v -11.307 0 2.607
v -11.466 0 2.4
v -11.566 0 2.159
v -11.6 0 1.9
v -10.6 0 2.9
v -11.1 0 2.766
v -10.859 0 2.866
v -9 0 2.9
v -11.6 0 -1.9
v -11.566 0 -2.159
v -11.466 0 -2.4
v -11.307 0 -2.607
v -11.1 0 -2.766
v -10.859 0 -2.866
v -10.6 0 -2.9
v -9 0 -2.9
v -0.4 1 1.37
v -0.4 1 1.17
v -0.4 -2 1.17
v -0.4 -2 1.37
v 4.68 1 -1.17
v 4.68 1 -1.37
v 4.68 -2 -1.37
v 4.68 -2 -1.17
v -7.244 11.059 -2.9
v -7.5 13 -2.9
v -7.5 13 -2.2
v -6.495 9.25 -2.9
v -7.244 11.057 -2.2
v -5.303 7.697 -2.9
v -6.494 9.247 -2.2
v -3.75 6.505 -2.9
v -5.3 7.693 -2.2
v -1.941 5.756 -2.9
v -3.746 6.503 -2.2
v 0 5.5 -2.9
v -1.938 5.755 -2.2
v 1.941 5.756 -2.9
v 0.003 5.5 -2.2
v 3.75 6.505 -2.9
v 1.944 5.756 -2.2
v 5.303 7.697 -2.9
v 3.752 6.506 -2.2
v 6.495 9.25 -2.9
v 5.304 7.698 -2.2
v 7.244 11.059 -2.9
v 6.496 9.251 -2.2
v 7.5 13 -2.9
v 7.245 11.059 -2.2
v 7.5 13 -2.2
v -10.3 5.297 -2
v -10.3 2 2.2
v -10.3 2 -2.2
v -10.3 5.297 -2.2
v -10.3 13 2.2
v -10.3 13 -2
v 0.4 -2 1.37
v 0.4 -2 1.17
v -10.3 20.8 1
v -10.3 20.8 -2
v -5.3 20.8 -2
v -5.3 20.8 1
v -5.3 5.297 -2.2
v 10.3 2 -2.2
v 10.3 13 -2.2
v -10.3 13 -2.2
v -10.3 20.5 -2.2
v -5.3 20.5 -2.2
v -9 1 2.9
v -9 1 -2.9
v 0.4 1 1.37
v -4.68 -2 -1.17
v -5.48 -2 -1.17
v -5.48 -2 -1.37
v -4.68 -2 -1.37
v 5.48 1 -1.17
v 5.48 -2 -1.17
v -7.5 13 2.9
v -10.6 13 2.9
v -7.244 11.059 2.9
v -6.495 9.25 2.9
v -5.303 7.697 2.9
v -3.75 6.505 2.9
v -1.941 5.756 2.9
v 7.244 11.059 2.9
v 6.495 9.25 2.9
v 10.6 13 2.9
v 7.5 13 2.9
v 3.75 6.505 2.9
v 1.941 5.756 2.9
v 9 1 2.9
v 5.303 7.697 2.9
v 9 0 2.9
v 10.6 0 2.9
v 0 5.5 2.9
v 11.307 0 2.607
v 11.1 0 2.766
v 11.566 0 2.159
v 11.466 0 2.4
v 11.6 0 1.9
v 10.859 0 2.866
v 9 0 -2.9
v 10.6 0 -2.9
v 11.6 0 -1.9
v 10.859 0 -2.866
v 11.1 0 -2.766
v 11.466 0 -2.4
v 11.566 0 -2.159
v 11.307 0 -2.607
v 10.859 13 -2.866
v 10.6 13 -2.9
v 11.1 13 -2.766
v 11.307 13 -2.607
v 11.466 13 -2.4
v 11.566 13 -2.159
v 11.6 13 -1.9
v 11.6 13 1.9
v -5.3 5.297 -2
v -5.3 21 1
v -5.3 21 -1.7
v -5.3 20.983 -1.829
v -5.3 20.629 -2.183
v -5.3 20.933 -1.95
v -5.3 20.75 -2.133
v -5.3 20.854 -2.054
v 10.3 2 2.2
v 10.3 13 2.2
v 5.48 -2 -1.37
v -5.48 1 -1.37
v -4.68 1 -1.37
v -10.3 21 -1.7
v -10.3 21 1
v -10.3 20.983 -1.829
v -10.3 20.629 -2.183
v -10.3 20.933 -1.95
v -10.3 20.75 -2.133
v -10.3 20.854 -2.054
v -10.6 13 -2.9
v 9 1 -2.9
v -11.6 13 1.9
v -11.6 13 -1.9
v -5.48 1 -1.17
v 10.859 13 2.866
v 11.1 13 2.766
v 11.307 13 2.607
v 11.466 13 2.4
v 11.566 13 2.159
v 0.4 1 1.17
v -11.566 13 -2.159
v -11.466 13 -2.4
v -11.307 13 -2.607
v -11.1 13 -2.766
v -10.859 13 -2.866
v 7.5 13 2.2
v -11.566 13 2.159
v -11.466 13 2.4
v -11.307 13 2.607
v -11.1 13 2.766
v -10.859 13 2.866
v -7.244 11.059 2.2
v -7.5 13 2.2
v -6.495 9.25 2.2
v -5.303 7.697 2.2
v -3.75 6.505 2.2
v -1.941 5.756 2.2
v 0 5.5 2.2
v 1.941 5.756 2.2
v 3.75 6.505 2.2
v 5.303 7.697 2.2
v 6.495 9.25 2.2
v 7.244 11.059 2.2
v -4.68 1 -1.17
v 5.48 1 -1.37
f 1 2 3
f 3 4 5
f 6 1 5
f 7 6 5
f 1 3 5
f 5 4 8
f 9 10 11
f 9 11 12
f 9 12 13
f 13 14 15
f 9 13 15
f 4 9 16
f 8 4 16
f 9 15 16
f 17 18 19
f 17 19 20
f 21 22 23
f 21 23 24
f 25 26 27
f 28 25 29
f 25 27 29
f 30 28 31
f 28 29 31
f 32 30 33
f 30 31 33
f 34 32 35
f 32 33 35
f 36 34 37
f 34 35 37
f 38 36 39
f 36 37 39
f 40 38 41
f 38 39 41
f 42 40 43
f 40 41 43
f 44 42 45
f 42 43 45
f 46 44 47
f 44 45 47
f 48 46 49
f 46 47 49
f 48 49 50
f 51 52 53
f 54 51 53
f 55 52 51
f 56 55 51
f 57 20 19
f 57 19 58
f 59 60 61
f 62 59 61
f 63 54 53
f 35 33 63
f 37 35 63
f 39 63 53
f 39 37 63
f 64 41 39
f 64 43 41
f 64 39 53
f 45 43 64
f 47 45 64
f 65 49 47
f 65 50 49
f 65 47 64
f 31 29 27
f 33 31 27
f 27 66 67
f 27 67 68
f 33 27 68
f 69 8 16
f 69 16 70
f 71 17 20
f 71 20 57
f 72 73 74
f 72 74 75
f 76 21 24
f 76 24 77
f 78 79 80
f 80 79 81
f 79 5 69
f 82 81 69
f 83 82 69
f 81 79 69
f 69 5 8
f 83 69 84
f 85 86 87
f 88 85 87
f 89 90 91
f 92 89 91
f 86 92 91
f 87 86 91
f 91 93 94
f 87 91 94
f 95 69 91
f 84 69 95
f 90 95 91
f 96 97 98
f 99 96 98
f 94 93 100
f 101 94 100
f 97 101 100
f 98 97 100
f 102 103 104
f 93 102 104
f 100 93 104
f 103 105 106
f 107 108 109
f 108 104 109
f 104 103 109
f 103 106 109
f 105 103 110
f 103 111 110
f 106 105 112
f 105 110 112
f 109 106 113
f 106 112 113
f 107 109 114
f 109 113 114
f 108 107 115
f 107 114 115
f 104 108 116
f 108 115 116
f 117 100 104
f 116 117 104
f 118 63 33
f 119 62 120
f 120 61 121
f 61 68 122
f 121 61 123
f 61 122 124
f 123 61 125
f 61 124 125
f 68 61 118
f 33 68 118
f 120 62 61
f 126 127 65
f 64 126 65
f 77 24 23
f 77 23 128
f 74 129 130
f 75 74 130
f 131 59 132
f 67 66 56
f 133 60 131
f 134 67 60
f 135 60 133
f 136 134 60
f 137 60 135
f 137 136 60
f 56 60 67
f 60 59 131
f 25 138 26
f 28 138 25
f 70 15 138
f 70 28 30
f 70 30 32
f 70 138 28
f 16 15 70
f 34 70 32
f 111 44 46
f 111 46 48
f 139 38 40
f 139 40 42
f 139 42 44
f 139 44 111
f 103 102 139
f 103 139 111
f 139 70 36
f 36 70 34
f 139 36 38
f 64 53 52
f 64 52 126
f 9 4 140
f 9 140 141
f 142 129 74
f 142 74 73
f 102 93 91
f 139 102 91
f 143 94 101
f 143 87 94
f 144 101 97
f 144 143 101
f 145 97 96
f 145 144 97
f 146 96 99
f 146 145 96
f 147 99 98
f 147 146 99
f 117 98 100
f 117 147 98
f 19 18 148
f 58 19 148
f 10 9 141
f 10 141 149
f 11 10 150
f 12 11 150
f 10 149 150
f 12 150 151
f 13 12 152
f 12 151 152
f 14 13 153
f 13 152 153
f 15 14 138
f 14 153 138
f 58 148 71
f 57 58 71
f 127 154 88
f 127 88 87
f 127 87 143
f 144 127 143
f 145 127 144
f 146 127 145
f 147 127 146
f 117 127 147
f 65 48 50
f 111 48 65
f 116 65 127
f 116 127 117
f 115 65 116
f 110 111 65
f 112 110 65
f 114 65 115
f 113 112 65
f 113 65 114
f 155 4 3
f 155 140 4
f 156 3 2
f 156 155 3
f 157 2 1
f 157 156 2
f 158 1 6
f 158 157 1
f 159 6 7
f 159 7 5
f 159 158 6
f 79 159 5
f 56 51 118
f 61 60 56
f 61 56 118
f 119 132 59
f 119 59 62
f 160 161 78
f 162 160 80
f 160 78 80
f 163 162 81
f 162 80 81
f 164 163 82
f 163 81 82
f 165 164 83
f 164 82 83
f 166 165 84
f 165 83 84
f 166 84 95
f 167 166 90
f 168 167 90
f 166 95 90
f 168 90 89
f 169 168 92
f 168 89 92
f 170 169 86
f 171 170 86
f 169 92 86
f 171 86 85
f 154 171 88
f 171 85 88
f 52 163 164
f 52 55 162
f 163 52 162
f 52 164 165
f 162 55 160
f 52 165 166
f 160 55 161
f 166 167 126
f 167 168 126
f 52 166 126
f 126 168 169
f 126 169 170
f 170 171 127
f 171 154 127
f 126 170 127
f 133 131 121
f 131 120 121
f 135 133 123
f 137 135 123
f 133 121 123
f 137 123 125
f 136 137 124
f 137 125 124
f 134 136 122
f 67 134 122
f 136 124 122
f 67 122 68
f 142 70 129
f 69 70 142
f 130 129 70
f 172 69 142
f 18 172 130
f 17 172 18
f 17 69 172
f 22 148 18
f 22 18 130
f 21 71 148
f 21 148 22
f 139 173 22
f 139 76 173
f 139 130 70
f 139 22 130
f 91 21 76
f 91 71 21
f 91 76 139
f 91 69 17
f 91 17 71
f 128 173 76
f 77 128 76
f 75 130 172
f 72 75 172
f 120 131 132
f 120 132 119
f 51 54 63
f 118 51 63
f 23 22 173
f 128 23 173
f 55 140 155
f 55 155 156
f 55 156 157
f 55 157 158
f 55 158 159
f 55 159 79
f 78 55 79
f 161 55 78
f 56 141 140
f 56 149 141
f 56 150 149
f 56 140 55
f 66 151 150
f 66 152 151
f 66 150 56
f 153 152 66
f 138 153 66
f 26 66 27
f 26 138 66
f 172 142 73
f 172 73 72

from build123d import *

# Parameters (mm, degrees)
SKETCH1_W           = 23.2
SKETCH1_H           = 5.8
BOSS_EXTRUDE1_DEPTH = 13
SKETCH2_R           = 7.5
SKETCH2_W           = 18
SKETCH2_H           = 5.61118816
CUT_EXTRUDE1_DEPTH  = 19.36300629
SKETCH3_W           = 20.6
SKETCH3_H           = 4.4
CUT_EXTRUDE2_DEPTH  = 11
SKETCH4_W           = 0.8
SKETCH4_H           = 0.2
BOSS_EXTRUDE2_DEPTH = 3
FILLET1_R           = 1
SKETCH5_W           = 5
SKETCH5_H           = 15.702848837
BOSS_EXTRUDE3_DEPTH = 0.2
SKETCH6_W           = 5
SKETCH6_H           = 0.2
BOSS_EXTRUDE4_DEPTH = 3
FILLET2_R           = 0.5


with BuildPart() as part:
    # Sketch1 → Boss-Extrude1 (new body)
    with BuildSketch(Plane(origin=(0, 0, 0), x_dir=(1, 0, 0), z_dir=(0, 1, 0))):
        Rectangle(SKETCH1_W, SKETCH1_H)
    extrude(amount=BOSS_EXTRUDE1_DEPTH)

    # Sketch2 → Cut-Extrude1 (cut, through all)
    with BuildSketch(Plane.XY.offset(2.9)):
        with Locations((0, 13)):
            Circle(SKETCH2_R)
        with Locations((0, -1.80559408)):
            Rectangle(SKETCH2_W, SKETCH2_H)
    extrude(amount=-CUT_EXTRUDE1_DEPTH, mode=Mode.SUBTRACT)

    # Sketch3 → Cut-Extrude2 (cut)
    with BuildSketch(Plane(origin=(0, 13, 0), x_dir=(1, 0, 0), z_dir=(0, 1, 0))):
        Rectangle(SKETCH3_W, SKETCH3_H)
    extrude(amount=-CUT_EXTRUDE2_DEPTH, mode=Mode.SUBTRACT)

    # Sketch4 → Boss-Extrude2 (add)
    with BuildSketch(Plane.XZ.offset(-1)):
        with Locations((0, 1.27)):
            Rectangle(SKETCH4_W, SKETCH4_H)
        with Locations((-5.08, -1.27)):
            Rectangle(SKETCH4_W, SKETCH4_H)
        with Locations((5.08, -1.27)):
            Rectangle(SKETCH4_W, SKETCH4_H)
    extrude(amount=BOSS_EXTRUDE2_DEPTH)

    # Fillet1
    fillet1_edges = [part.edges().sort_by_distance(p)[0] for p in [
        (11.6, 6.5, 2.9),
        (-11.6, 6.5, 2.9),
        (-11.6, 6.5, -2.9),
        (11.6, 6.5, -2.9),
    ]]
    fillet(fillet1_edges, radius=FILLET1_R)

    # Sketch5 → Boss-Extrude3 (add)
    with BuildSketch(Plane.XY.offset(-2.2)):
        with Locations((-7.8, 13.148575582)):
            Rectangle(SKETCH5_W, SKETCH5_H)
    extrude(amount=BOSS_EXTRUDE3_DEPTH)

    # Sketch6 → Boss-Extrude4 (add)
    with BuildSketch(Plane.XY.offset(-2)):
        with Locations((-7.8, 20.9)):
            Rectangle(SKETCH6_W, SKETCH6_H)
    extrude(amount=BOSS_EXTRUDE4_DEPTH)

    # Fillet2
    fillet2_edges = [part.edges().sort_by_distance(p)[0] for p in [
        (-7.8, 21, -2.2),
    ]]
    fillet(fillet2_edges, radius=FILLET2_R)


solid = part.part
